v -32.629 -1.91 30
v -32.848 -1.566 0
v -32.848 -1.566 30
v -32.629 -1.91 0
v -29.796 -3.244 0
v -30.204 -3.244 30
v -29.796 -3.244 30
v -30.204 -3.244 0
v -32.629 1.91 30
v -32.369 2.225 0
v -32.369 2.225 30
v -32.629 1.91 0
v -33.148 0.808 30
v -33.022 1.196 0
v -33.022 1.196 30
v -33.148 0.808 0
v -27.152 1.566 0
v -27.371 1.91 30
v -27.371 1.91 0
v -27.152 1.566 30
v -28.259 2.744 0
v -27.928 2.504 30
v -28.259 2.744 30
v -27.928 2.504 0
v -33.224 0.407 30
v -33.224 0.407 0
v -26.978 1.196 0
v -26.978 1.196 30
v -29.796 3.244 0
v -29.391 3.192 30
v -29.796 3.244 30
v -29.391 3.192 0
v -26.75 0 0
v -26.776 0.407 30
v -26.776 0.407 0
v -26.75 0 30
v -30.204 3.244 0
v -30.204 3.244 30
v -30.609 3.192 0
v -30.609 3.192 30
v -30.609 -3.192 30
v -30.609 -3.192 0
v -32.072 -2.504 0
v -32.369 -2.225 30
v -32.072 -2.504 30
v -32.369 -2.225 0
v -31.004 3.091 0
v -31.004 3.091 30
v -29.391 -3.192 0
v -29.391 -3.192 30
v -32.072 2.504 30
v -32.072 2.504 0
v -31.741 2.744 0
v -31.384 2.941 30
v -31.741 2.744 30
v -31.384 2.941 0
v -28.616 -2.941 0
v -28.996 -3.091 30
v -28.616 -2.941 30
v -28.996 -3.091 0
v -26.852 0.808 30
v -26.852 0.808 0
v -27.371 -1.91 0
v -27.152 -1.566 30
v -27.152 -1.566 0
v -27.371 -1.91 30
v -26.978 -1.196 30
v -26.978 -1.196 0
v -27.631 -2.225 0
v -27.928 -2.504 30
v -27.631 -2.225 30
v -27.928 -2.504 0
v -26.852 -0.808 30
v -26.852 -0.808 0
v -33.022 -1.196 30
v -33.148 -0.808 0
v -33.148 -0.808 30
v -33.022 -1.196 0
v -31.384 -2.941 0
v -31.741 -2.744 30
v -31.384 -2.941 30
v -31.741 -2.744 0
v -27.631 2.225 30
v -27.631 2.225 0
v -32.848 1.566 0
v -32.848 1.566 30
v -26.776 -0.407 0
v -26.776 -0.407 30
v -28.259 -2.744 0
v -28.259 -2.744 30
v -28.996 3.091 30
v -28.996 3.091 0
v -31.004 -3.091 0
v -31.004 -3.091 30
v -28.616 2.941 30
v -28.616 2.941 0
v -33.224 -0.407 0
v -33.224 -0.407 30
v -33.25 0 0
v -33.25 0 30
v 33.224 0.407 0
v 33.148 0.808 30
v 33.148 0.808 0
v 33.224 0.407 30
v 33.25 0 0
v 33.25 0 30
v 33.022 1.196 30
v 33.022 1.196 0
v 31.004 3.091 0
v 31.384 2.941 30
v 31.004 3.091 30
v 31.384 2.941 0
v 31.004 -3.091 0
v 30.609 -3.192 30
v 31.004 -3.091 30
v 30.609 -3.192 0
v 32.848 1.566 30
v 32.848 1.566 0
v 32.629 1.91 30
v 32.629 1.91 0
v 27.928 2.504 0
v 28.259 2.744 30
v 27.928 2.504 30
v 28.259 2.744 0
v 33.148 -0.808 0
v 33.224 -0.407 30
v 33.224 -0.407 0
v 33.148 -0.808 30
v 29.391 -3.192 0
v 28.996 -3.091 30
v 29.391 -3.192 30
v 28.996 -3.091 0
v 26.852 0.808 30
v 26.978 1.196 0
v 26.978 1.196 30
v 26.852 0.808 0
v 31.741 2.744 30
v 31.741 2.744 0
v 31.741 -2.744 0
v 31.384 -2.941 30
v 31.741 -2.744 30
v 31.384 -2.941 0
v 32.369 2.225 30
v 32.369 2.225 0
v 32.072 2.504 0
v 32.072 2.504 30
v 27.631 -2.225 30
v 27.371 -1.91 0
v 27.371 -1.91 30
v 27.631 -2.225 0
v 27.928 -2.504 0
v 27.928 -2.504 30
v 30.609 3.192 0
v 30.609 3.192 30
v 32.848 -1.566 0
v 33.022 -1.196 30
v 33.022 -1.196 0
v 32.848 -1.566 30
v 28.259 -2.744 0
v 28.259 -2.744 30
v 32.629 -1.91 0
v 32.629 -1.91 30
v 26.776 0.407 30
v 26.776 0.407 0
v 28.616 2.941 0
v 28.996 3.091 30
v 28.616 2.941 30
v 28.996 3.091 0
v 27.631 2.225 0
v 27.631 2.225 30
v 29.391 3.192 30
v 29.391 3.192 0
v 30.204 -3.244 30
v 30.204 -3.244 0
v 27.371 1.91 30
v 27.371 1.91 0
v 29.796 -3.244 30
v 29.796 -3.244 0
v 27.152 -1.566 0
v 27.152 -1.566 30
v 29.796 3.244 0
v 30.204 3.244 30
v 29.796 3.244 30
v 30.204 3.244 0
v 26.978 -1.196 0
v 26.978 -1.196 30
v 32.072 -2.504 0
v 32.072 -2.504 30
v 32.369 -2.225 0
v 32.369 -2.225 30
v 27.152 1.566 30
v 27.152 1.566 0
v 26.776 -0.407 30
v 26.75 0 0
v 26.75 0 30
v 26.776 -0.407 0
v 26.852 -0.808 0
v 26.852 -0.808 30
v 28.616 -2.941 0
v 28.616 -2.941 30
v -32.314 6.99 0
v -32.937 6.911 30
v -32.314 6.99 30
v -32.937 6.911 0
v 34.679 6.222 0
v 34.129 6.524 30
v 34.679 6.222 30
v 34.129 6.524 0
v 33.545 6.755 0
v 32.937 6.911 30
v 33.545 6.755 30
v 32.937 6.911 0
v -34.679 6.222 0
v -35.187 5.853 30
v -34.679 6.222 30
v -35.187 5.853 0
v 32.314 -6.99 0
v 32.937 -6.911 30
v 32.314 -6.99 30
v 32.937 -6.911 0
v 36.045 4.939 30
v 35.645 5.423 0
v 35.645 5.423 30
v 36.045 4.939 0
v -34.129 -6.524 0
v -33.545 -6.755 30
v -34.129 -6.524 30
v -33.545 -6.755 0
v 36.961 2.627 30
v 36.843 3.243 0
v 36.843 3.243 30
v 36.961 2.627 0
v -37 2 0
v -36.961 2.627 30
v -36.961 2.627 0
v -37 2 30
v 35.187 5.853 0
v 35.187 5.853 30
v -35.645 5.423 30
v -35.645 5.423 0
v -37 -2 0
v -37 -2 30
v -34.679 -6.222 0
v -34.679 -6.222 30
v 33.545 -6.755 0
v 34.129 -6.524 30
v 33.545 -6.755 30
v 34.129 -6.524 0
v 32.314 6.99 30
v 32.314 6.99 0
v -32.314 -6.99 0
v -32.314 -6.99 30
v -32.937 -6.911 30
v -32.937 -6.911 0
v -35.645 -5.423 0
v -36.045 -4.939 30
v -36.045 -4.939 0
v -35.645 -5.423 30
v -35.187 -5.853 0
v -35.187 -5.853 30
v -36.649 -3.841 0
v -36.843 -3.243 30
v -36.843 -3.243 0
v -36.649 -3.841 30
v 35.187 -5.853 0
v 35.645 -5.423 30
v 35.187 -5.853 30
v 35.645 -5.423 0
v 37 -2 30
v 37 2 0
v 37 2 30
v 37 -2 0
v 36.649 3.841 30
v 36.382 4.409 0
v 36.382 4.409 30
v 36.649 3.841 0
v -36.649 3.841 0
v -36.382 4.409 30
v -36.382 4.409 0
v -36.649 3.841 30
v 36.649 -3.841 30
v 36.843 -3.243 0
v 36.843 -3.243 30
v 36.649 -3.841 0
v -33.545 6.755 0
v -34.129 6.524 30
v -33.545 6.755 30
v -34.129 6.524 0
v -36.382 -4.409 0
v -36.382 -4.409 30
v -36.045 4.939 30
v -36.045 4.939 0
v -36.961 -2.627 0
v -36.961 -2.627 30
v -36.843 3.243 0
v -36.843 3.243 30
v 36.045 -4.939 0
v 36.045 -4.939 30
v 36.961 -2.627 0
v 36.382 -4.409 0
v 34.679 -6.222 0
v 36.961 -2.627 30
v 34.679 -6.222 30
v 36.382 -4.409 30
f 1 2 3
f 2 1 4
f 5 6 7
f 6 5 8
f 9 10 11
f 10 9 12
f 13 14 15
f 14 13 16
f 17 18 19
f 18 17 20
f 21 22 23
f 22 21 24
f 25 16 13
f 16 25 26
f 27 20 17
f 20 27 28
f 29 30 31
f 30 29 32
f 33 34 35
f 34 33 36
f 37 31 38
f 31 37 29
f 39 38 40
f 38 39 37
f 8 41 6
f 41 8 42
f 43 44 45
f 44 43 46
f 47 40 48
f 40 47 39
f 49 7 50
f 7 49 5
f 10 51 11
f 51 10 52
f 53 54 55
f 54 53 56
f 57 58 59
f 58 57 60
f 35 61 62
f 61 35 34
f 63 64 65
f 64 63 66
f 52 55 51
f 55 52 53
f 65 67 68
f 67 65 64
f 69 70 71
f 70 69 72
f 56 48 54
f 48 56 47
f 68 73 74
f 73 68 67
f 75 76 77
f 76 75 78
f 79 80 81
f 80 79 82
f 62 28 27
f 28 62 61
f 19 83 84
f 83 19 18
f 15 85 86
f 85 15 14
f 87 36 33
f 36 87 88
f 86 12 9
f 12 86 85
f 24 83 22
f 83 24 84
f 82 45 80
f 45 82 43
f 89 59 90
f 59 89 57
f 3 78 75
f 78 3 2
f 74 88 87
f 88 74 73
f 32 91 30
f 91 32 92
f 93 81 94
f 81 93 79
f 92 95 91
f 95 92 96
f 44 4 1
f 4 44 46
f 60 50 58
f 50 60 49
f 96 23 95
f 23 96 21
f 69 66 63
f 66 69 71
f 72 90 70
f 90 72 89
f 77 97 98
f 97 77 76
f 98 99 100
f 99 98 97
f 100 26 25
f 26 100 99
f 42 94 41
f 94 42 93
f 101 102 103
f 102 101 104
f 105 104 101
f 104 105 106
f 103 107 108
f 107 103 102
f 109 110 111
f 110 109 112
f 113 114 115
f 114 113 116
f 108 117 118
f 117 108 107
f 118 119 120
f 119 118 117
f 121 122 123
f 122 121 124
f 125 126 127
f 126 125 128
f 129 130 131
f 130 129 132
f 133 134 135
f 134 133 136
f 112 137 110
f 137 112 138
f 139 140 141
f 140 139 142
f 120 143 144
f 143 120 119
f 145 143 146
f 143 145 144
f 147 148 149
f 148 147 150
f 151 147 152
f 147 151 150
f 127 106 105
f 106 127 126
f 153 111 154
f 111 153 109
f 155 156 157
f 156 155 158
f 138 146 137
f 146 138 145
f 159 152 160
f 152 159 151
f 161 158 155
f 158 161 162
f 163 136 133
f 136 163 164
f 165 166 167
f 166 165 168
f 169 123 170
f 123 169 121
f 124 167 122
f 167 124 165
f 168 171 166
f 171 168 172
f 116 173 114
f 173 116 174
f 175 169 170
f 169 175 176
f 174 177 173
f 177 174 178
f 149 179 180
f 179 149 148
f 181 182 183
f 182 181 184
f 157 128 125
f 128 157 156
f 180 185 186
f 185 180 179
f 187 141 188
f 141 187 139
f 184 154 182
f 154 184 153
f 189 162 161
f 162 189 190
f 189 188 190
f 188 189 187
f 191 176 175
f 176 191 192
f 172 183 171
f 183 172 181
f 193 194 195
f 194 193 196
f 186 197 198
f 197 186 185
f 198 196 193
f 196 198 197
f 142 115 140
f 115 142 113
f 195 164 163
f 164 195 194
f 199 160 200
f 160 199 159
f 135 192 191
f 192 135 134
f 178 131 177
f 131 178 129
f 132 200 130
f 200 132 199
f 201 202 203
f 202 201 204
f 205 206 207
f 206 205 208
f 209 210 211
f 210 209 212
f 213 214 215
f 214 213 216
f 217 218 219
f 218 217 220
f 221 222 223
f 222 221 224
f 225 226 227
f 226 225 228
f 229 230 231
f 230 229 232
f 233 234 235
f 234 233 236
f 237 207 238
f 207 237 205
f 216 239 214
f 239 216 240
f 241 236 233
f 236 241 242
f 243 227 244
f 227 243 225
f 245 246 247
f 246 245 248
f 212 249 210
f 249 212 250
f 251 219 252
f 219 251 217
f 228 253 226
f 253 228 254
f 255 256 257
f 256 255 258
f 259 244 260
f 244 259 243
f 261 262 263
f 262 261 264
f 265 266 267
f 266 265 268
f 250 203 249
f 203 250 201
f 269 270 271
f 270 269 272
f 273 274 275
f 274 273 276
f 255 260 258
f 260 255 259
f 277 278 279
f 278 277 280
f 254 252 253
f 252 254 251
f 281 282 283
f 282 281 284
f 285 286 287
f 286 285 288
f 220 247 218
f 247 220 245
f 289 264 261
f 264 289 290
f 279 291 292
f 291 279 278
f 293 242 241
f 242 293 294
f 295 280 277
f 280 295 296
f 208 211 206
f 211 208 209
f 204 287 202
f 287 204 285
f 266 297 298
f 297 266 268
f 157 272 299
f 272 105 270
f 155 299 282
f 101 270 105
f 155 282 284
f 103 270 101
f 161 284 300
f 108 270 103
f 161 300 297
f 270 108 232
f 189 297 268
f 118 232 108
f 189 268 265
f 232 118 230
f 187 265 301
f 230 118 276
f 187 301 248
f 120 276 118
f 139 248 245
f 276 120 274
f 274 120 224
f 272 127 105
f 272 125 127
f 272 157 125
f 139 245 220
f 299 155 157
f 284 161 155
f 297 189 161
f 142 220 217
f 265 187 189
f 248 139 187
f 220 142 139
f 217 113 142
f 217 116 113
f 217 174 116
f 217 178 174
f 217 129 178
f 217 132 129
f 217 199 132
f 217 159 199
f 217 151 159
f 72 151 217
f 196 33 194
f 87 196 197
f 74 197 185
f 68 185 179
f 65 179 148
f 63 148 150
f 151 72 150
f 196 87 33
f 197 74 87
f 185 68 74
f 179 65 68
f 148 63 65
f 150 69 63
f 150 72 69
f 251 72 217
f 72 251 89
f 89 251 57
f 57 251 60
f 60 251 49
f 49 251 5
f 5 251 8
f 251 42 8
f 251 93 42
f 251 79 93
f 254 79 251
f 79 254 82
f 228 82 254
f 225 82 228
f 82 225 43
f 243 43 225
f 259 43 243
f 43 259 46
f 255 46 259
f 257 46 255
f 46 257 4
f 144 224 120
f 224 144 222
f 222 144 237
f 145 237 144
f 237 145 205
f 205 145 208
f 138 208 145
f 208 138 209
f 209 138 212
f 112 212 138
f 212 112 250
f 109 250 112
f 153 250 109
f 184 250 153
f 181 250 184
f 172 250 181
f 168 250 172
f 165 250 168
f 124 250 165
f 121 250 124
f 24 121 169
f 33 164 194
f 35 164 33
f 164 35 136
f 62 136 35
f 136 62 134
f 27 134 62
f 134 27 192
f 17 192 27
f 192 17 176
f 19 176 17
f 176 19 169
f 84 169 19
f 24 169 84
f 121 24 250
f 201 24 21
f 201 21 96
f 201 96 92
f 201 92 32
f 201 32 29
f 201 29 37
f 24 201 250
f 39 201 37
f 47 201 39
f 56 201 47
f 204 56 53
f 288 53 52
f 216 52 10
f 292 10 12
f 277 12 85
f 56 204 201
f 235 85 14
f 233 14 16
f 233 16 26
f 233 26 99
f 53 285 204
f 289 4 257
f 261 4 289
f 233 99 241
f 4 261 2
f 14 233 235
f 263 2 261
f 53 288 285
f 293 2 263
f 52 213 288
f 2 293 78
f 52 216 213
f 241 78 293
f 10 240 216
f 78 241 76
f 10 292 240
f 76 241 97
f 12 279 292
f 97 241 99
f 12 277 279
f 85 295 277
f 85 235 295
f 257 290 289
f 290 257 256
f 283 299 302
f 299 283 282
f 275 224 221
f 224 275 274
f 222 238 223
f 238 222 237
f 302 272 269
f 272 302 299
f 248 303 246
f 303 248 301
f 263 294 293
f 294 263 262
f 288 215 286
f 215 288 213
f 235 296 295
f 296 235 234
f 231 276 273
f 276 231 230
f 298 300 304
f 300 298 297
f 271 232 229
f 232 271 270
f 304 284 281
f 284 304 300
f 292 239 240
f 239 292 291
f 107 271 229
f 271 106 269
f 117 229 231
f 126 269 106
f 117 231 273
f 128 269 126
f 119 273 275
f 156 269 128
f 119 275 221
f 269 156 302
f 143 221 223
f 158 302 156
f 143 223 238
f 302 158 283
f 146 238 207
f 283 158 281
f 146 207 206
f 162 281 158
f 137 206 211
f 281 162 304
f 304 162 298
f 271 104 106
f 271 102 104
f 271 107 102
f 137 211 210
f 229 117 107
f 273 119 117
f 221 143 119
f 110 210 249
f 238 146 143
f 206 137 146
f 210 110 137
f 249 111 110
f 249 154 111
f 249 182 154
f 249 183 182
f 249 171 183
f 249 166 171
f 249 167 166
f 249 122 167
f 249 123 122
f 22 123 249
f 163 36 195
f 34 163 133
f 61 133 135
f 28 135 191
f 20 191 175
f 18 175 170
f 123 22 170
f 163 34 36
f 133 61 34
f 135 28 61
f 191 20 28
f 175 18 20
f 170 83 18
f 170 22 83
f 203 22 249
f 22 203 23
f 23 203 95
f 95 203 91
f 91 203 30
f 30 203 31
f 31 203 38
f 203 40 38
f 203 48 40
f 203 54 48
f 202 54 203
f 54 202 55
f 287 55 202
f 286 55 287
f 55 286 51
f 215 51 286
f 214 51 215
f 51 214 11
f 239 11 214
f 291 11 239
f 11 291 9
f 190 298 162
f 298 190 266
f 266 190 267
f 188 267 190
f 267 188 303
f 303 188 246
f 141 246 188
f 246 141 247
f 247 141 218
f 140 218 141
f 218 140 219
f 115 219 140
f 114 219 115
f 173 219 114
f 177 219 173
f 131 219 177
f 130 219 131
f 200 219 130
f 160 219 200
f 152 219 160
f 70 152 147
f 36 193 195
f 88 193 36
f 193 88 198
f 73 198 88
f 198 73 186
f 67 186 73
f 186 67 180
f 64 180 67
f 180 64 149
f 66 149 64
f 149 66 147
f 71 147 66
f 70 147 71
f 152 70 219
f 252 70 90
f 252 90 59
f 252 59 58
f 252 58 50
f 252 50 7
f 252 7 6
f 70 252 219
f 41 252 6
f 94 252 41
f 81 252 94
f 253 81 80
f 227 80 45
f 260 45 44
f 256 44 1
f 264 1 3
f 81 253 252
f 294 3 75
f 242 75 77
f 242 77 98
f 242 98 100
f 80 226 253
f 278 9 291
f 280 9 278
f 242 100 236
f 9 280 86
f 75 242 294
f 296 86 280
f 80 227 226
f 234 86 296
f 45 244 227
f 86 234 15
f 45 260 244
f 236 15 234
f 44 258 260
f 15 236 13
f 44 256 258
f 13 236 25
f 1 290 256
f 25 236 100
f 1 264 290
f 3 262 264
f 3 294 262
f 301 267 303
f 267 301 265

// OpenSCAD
$fn = 50;


difference() {
	union() {
		hull() {
			translate(v = [-32.0000000000, 2.0000000000, 0]) {
				cylinder(h = 30, r = 5);
			}
			translate(v = [32.0000000000, 2.0000000000, 0]) {
				cylinder(h = 30, r = 5);
			}
			translate(v = [-32.0000000000, -2.0000000000, 0]) {
				cylinder(h = 30, r = 5);
			}
			translate(v = [32.0000000000, -2.0000000000, 0]) {
				cylinder(h = 30, r = 5);
			}
		}
	}
	union() {
		translate(v = [-30.0000000000, 0.0000000000, -100.0000000000]) {
			cylinder(h = 200, r = 3.2500000000);
		}
		translate(v = [-30.0000000000, 0.0000000000, -100.0000000000]) {
			cylinder(h = 200, r = 3.2500000000);
		}
		translate(v = [30.0000000000, 0.0000000000, -100.0000000000]) {
			cylinder(h = 200, r = 3.2500000000);
		}
		translate(v = [30.0000000000, 0.0000000000, -100.0000000000]) {
			cylinder(h = 200, r = 3.2500000000);
		}
	}
}
